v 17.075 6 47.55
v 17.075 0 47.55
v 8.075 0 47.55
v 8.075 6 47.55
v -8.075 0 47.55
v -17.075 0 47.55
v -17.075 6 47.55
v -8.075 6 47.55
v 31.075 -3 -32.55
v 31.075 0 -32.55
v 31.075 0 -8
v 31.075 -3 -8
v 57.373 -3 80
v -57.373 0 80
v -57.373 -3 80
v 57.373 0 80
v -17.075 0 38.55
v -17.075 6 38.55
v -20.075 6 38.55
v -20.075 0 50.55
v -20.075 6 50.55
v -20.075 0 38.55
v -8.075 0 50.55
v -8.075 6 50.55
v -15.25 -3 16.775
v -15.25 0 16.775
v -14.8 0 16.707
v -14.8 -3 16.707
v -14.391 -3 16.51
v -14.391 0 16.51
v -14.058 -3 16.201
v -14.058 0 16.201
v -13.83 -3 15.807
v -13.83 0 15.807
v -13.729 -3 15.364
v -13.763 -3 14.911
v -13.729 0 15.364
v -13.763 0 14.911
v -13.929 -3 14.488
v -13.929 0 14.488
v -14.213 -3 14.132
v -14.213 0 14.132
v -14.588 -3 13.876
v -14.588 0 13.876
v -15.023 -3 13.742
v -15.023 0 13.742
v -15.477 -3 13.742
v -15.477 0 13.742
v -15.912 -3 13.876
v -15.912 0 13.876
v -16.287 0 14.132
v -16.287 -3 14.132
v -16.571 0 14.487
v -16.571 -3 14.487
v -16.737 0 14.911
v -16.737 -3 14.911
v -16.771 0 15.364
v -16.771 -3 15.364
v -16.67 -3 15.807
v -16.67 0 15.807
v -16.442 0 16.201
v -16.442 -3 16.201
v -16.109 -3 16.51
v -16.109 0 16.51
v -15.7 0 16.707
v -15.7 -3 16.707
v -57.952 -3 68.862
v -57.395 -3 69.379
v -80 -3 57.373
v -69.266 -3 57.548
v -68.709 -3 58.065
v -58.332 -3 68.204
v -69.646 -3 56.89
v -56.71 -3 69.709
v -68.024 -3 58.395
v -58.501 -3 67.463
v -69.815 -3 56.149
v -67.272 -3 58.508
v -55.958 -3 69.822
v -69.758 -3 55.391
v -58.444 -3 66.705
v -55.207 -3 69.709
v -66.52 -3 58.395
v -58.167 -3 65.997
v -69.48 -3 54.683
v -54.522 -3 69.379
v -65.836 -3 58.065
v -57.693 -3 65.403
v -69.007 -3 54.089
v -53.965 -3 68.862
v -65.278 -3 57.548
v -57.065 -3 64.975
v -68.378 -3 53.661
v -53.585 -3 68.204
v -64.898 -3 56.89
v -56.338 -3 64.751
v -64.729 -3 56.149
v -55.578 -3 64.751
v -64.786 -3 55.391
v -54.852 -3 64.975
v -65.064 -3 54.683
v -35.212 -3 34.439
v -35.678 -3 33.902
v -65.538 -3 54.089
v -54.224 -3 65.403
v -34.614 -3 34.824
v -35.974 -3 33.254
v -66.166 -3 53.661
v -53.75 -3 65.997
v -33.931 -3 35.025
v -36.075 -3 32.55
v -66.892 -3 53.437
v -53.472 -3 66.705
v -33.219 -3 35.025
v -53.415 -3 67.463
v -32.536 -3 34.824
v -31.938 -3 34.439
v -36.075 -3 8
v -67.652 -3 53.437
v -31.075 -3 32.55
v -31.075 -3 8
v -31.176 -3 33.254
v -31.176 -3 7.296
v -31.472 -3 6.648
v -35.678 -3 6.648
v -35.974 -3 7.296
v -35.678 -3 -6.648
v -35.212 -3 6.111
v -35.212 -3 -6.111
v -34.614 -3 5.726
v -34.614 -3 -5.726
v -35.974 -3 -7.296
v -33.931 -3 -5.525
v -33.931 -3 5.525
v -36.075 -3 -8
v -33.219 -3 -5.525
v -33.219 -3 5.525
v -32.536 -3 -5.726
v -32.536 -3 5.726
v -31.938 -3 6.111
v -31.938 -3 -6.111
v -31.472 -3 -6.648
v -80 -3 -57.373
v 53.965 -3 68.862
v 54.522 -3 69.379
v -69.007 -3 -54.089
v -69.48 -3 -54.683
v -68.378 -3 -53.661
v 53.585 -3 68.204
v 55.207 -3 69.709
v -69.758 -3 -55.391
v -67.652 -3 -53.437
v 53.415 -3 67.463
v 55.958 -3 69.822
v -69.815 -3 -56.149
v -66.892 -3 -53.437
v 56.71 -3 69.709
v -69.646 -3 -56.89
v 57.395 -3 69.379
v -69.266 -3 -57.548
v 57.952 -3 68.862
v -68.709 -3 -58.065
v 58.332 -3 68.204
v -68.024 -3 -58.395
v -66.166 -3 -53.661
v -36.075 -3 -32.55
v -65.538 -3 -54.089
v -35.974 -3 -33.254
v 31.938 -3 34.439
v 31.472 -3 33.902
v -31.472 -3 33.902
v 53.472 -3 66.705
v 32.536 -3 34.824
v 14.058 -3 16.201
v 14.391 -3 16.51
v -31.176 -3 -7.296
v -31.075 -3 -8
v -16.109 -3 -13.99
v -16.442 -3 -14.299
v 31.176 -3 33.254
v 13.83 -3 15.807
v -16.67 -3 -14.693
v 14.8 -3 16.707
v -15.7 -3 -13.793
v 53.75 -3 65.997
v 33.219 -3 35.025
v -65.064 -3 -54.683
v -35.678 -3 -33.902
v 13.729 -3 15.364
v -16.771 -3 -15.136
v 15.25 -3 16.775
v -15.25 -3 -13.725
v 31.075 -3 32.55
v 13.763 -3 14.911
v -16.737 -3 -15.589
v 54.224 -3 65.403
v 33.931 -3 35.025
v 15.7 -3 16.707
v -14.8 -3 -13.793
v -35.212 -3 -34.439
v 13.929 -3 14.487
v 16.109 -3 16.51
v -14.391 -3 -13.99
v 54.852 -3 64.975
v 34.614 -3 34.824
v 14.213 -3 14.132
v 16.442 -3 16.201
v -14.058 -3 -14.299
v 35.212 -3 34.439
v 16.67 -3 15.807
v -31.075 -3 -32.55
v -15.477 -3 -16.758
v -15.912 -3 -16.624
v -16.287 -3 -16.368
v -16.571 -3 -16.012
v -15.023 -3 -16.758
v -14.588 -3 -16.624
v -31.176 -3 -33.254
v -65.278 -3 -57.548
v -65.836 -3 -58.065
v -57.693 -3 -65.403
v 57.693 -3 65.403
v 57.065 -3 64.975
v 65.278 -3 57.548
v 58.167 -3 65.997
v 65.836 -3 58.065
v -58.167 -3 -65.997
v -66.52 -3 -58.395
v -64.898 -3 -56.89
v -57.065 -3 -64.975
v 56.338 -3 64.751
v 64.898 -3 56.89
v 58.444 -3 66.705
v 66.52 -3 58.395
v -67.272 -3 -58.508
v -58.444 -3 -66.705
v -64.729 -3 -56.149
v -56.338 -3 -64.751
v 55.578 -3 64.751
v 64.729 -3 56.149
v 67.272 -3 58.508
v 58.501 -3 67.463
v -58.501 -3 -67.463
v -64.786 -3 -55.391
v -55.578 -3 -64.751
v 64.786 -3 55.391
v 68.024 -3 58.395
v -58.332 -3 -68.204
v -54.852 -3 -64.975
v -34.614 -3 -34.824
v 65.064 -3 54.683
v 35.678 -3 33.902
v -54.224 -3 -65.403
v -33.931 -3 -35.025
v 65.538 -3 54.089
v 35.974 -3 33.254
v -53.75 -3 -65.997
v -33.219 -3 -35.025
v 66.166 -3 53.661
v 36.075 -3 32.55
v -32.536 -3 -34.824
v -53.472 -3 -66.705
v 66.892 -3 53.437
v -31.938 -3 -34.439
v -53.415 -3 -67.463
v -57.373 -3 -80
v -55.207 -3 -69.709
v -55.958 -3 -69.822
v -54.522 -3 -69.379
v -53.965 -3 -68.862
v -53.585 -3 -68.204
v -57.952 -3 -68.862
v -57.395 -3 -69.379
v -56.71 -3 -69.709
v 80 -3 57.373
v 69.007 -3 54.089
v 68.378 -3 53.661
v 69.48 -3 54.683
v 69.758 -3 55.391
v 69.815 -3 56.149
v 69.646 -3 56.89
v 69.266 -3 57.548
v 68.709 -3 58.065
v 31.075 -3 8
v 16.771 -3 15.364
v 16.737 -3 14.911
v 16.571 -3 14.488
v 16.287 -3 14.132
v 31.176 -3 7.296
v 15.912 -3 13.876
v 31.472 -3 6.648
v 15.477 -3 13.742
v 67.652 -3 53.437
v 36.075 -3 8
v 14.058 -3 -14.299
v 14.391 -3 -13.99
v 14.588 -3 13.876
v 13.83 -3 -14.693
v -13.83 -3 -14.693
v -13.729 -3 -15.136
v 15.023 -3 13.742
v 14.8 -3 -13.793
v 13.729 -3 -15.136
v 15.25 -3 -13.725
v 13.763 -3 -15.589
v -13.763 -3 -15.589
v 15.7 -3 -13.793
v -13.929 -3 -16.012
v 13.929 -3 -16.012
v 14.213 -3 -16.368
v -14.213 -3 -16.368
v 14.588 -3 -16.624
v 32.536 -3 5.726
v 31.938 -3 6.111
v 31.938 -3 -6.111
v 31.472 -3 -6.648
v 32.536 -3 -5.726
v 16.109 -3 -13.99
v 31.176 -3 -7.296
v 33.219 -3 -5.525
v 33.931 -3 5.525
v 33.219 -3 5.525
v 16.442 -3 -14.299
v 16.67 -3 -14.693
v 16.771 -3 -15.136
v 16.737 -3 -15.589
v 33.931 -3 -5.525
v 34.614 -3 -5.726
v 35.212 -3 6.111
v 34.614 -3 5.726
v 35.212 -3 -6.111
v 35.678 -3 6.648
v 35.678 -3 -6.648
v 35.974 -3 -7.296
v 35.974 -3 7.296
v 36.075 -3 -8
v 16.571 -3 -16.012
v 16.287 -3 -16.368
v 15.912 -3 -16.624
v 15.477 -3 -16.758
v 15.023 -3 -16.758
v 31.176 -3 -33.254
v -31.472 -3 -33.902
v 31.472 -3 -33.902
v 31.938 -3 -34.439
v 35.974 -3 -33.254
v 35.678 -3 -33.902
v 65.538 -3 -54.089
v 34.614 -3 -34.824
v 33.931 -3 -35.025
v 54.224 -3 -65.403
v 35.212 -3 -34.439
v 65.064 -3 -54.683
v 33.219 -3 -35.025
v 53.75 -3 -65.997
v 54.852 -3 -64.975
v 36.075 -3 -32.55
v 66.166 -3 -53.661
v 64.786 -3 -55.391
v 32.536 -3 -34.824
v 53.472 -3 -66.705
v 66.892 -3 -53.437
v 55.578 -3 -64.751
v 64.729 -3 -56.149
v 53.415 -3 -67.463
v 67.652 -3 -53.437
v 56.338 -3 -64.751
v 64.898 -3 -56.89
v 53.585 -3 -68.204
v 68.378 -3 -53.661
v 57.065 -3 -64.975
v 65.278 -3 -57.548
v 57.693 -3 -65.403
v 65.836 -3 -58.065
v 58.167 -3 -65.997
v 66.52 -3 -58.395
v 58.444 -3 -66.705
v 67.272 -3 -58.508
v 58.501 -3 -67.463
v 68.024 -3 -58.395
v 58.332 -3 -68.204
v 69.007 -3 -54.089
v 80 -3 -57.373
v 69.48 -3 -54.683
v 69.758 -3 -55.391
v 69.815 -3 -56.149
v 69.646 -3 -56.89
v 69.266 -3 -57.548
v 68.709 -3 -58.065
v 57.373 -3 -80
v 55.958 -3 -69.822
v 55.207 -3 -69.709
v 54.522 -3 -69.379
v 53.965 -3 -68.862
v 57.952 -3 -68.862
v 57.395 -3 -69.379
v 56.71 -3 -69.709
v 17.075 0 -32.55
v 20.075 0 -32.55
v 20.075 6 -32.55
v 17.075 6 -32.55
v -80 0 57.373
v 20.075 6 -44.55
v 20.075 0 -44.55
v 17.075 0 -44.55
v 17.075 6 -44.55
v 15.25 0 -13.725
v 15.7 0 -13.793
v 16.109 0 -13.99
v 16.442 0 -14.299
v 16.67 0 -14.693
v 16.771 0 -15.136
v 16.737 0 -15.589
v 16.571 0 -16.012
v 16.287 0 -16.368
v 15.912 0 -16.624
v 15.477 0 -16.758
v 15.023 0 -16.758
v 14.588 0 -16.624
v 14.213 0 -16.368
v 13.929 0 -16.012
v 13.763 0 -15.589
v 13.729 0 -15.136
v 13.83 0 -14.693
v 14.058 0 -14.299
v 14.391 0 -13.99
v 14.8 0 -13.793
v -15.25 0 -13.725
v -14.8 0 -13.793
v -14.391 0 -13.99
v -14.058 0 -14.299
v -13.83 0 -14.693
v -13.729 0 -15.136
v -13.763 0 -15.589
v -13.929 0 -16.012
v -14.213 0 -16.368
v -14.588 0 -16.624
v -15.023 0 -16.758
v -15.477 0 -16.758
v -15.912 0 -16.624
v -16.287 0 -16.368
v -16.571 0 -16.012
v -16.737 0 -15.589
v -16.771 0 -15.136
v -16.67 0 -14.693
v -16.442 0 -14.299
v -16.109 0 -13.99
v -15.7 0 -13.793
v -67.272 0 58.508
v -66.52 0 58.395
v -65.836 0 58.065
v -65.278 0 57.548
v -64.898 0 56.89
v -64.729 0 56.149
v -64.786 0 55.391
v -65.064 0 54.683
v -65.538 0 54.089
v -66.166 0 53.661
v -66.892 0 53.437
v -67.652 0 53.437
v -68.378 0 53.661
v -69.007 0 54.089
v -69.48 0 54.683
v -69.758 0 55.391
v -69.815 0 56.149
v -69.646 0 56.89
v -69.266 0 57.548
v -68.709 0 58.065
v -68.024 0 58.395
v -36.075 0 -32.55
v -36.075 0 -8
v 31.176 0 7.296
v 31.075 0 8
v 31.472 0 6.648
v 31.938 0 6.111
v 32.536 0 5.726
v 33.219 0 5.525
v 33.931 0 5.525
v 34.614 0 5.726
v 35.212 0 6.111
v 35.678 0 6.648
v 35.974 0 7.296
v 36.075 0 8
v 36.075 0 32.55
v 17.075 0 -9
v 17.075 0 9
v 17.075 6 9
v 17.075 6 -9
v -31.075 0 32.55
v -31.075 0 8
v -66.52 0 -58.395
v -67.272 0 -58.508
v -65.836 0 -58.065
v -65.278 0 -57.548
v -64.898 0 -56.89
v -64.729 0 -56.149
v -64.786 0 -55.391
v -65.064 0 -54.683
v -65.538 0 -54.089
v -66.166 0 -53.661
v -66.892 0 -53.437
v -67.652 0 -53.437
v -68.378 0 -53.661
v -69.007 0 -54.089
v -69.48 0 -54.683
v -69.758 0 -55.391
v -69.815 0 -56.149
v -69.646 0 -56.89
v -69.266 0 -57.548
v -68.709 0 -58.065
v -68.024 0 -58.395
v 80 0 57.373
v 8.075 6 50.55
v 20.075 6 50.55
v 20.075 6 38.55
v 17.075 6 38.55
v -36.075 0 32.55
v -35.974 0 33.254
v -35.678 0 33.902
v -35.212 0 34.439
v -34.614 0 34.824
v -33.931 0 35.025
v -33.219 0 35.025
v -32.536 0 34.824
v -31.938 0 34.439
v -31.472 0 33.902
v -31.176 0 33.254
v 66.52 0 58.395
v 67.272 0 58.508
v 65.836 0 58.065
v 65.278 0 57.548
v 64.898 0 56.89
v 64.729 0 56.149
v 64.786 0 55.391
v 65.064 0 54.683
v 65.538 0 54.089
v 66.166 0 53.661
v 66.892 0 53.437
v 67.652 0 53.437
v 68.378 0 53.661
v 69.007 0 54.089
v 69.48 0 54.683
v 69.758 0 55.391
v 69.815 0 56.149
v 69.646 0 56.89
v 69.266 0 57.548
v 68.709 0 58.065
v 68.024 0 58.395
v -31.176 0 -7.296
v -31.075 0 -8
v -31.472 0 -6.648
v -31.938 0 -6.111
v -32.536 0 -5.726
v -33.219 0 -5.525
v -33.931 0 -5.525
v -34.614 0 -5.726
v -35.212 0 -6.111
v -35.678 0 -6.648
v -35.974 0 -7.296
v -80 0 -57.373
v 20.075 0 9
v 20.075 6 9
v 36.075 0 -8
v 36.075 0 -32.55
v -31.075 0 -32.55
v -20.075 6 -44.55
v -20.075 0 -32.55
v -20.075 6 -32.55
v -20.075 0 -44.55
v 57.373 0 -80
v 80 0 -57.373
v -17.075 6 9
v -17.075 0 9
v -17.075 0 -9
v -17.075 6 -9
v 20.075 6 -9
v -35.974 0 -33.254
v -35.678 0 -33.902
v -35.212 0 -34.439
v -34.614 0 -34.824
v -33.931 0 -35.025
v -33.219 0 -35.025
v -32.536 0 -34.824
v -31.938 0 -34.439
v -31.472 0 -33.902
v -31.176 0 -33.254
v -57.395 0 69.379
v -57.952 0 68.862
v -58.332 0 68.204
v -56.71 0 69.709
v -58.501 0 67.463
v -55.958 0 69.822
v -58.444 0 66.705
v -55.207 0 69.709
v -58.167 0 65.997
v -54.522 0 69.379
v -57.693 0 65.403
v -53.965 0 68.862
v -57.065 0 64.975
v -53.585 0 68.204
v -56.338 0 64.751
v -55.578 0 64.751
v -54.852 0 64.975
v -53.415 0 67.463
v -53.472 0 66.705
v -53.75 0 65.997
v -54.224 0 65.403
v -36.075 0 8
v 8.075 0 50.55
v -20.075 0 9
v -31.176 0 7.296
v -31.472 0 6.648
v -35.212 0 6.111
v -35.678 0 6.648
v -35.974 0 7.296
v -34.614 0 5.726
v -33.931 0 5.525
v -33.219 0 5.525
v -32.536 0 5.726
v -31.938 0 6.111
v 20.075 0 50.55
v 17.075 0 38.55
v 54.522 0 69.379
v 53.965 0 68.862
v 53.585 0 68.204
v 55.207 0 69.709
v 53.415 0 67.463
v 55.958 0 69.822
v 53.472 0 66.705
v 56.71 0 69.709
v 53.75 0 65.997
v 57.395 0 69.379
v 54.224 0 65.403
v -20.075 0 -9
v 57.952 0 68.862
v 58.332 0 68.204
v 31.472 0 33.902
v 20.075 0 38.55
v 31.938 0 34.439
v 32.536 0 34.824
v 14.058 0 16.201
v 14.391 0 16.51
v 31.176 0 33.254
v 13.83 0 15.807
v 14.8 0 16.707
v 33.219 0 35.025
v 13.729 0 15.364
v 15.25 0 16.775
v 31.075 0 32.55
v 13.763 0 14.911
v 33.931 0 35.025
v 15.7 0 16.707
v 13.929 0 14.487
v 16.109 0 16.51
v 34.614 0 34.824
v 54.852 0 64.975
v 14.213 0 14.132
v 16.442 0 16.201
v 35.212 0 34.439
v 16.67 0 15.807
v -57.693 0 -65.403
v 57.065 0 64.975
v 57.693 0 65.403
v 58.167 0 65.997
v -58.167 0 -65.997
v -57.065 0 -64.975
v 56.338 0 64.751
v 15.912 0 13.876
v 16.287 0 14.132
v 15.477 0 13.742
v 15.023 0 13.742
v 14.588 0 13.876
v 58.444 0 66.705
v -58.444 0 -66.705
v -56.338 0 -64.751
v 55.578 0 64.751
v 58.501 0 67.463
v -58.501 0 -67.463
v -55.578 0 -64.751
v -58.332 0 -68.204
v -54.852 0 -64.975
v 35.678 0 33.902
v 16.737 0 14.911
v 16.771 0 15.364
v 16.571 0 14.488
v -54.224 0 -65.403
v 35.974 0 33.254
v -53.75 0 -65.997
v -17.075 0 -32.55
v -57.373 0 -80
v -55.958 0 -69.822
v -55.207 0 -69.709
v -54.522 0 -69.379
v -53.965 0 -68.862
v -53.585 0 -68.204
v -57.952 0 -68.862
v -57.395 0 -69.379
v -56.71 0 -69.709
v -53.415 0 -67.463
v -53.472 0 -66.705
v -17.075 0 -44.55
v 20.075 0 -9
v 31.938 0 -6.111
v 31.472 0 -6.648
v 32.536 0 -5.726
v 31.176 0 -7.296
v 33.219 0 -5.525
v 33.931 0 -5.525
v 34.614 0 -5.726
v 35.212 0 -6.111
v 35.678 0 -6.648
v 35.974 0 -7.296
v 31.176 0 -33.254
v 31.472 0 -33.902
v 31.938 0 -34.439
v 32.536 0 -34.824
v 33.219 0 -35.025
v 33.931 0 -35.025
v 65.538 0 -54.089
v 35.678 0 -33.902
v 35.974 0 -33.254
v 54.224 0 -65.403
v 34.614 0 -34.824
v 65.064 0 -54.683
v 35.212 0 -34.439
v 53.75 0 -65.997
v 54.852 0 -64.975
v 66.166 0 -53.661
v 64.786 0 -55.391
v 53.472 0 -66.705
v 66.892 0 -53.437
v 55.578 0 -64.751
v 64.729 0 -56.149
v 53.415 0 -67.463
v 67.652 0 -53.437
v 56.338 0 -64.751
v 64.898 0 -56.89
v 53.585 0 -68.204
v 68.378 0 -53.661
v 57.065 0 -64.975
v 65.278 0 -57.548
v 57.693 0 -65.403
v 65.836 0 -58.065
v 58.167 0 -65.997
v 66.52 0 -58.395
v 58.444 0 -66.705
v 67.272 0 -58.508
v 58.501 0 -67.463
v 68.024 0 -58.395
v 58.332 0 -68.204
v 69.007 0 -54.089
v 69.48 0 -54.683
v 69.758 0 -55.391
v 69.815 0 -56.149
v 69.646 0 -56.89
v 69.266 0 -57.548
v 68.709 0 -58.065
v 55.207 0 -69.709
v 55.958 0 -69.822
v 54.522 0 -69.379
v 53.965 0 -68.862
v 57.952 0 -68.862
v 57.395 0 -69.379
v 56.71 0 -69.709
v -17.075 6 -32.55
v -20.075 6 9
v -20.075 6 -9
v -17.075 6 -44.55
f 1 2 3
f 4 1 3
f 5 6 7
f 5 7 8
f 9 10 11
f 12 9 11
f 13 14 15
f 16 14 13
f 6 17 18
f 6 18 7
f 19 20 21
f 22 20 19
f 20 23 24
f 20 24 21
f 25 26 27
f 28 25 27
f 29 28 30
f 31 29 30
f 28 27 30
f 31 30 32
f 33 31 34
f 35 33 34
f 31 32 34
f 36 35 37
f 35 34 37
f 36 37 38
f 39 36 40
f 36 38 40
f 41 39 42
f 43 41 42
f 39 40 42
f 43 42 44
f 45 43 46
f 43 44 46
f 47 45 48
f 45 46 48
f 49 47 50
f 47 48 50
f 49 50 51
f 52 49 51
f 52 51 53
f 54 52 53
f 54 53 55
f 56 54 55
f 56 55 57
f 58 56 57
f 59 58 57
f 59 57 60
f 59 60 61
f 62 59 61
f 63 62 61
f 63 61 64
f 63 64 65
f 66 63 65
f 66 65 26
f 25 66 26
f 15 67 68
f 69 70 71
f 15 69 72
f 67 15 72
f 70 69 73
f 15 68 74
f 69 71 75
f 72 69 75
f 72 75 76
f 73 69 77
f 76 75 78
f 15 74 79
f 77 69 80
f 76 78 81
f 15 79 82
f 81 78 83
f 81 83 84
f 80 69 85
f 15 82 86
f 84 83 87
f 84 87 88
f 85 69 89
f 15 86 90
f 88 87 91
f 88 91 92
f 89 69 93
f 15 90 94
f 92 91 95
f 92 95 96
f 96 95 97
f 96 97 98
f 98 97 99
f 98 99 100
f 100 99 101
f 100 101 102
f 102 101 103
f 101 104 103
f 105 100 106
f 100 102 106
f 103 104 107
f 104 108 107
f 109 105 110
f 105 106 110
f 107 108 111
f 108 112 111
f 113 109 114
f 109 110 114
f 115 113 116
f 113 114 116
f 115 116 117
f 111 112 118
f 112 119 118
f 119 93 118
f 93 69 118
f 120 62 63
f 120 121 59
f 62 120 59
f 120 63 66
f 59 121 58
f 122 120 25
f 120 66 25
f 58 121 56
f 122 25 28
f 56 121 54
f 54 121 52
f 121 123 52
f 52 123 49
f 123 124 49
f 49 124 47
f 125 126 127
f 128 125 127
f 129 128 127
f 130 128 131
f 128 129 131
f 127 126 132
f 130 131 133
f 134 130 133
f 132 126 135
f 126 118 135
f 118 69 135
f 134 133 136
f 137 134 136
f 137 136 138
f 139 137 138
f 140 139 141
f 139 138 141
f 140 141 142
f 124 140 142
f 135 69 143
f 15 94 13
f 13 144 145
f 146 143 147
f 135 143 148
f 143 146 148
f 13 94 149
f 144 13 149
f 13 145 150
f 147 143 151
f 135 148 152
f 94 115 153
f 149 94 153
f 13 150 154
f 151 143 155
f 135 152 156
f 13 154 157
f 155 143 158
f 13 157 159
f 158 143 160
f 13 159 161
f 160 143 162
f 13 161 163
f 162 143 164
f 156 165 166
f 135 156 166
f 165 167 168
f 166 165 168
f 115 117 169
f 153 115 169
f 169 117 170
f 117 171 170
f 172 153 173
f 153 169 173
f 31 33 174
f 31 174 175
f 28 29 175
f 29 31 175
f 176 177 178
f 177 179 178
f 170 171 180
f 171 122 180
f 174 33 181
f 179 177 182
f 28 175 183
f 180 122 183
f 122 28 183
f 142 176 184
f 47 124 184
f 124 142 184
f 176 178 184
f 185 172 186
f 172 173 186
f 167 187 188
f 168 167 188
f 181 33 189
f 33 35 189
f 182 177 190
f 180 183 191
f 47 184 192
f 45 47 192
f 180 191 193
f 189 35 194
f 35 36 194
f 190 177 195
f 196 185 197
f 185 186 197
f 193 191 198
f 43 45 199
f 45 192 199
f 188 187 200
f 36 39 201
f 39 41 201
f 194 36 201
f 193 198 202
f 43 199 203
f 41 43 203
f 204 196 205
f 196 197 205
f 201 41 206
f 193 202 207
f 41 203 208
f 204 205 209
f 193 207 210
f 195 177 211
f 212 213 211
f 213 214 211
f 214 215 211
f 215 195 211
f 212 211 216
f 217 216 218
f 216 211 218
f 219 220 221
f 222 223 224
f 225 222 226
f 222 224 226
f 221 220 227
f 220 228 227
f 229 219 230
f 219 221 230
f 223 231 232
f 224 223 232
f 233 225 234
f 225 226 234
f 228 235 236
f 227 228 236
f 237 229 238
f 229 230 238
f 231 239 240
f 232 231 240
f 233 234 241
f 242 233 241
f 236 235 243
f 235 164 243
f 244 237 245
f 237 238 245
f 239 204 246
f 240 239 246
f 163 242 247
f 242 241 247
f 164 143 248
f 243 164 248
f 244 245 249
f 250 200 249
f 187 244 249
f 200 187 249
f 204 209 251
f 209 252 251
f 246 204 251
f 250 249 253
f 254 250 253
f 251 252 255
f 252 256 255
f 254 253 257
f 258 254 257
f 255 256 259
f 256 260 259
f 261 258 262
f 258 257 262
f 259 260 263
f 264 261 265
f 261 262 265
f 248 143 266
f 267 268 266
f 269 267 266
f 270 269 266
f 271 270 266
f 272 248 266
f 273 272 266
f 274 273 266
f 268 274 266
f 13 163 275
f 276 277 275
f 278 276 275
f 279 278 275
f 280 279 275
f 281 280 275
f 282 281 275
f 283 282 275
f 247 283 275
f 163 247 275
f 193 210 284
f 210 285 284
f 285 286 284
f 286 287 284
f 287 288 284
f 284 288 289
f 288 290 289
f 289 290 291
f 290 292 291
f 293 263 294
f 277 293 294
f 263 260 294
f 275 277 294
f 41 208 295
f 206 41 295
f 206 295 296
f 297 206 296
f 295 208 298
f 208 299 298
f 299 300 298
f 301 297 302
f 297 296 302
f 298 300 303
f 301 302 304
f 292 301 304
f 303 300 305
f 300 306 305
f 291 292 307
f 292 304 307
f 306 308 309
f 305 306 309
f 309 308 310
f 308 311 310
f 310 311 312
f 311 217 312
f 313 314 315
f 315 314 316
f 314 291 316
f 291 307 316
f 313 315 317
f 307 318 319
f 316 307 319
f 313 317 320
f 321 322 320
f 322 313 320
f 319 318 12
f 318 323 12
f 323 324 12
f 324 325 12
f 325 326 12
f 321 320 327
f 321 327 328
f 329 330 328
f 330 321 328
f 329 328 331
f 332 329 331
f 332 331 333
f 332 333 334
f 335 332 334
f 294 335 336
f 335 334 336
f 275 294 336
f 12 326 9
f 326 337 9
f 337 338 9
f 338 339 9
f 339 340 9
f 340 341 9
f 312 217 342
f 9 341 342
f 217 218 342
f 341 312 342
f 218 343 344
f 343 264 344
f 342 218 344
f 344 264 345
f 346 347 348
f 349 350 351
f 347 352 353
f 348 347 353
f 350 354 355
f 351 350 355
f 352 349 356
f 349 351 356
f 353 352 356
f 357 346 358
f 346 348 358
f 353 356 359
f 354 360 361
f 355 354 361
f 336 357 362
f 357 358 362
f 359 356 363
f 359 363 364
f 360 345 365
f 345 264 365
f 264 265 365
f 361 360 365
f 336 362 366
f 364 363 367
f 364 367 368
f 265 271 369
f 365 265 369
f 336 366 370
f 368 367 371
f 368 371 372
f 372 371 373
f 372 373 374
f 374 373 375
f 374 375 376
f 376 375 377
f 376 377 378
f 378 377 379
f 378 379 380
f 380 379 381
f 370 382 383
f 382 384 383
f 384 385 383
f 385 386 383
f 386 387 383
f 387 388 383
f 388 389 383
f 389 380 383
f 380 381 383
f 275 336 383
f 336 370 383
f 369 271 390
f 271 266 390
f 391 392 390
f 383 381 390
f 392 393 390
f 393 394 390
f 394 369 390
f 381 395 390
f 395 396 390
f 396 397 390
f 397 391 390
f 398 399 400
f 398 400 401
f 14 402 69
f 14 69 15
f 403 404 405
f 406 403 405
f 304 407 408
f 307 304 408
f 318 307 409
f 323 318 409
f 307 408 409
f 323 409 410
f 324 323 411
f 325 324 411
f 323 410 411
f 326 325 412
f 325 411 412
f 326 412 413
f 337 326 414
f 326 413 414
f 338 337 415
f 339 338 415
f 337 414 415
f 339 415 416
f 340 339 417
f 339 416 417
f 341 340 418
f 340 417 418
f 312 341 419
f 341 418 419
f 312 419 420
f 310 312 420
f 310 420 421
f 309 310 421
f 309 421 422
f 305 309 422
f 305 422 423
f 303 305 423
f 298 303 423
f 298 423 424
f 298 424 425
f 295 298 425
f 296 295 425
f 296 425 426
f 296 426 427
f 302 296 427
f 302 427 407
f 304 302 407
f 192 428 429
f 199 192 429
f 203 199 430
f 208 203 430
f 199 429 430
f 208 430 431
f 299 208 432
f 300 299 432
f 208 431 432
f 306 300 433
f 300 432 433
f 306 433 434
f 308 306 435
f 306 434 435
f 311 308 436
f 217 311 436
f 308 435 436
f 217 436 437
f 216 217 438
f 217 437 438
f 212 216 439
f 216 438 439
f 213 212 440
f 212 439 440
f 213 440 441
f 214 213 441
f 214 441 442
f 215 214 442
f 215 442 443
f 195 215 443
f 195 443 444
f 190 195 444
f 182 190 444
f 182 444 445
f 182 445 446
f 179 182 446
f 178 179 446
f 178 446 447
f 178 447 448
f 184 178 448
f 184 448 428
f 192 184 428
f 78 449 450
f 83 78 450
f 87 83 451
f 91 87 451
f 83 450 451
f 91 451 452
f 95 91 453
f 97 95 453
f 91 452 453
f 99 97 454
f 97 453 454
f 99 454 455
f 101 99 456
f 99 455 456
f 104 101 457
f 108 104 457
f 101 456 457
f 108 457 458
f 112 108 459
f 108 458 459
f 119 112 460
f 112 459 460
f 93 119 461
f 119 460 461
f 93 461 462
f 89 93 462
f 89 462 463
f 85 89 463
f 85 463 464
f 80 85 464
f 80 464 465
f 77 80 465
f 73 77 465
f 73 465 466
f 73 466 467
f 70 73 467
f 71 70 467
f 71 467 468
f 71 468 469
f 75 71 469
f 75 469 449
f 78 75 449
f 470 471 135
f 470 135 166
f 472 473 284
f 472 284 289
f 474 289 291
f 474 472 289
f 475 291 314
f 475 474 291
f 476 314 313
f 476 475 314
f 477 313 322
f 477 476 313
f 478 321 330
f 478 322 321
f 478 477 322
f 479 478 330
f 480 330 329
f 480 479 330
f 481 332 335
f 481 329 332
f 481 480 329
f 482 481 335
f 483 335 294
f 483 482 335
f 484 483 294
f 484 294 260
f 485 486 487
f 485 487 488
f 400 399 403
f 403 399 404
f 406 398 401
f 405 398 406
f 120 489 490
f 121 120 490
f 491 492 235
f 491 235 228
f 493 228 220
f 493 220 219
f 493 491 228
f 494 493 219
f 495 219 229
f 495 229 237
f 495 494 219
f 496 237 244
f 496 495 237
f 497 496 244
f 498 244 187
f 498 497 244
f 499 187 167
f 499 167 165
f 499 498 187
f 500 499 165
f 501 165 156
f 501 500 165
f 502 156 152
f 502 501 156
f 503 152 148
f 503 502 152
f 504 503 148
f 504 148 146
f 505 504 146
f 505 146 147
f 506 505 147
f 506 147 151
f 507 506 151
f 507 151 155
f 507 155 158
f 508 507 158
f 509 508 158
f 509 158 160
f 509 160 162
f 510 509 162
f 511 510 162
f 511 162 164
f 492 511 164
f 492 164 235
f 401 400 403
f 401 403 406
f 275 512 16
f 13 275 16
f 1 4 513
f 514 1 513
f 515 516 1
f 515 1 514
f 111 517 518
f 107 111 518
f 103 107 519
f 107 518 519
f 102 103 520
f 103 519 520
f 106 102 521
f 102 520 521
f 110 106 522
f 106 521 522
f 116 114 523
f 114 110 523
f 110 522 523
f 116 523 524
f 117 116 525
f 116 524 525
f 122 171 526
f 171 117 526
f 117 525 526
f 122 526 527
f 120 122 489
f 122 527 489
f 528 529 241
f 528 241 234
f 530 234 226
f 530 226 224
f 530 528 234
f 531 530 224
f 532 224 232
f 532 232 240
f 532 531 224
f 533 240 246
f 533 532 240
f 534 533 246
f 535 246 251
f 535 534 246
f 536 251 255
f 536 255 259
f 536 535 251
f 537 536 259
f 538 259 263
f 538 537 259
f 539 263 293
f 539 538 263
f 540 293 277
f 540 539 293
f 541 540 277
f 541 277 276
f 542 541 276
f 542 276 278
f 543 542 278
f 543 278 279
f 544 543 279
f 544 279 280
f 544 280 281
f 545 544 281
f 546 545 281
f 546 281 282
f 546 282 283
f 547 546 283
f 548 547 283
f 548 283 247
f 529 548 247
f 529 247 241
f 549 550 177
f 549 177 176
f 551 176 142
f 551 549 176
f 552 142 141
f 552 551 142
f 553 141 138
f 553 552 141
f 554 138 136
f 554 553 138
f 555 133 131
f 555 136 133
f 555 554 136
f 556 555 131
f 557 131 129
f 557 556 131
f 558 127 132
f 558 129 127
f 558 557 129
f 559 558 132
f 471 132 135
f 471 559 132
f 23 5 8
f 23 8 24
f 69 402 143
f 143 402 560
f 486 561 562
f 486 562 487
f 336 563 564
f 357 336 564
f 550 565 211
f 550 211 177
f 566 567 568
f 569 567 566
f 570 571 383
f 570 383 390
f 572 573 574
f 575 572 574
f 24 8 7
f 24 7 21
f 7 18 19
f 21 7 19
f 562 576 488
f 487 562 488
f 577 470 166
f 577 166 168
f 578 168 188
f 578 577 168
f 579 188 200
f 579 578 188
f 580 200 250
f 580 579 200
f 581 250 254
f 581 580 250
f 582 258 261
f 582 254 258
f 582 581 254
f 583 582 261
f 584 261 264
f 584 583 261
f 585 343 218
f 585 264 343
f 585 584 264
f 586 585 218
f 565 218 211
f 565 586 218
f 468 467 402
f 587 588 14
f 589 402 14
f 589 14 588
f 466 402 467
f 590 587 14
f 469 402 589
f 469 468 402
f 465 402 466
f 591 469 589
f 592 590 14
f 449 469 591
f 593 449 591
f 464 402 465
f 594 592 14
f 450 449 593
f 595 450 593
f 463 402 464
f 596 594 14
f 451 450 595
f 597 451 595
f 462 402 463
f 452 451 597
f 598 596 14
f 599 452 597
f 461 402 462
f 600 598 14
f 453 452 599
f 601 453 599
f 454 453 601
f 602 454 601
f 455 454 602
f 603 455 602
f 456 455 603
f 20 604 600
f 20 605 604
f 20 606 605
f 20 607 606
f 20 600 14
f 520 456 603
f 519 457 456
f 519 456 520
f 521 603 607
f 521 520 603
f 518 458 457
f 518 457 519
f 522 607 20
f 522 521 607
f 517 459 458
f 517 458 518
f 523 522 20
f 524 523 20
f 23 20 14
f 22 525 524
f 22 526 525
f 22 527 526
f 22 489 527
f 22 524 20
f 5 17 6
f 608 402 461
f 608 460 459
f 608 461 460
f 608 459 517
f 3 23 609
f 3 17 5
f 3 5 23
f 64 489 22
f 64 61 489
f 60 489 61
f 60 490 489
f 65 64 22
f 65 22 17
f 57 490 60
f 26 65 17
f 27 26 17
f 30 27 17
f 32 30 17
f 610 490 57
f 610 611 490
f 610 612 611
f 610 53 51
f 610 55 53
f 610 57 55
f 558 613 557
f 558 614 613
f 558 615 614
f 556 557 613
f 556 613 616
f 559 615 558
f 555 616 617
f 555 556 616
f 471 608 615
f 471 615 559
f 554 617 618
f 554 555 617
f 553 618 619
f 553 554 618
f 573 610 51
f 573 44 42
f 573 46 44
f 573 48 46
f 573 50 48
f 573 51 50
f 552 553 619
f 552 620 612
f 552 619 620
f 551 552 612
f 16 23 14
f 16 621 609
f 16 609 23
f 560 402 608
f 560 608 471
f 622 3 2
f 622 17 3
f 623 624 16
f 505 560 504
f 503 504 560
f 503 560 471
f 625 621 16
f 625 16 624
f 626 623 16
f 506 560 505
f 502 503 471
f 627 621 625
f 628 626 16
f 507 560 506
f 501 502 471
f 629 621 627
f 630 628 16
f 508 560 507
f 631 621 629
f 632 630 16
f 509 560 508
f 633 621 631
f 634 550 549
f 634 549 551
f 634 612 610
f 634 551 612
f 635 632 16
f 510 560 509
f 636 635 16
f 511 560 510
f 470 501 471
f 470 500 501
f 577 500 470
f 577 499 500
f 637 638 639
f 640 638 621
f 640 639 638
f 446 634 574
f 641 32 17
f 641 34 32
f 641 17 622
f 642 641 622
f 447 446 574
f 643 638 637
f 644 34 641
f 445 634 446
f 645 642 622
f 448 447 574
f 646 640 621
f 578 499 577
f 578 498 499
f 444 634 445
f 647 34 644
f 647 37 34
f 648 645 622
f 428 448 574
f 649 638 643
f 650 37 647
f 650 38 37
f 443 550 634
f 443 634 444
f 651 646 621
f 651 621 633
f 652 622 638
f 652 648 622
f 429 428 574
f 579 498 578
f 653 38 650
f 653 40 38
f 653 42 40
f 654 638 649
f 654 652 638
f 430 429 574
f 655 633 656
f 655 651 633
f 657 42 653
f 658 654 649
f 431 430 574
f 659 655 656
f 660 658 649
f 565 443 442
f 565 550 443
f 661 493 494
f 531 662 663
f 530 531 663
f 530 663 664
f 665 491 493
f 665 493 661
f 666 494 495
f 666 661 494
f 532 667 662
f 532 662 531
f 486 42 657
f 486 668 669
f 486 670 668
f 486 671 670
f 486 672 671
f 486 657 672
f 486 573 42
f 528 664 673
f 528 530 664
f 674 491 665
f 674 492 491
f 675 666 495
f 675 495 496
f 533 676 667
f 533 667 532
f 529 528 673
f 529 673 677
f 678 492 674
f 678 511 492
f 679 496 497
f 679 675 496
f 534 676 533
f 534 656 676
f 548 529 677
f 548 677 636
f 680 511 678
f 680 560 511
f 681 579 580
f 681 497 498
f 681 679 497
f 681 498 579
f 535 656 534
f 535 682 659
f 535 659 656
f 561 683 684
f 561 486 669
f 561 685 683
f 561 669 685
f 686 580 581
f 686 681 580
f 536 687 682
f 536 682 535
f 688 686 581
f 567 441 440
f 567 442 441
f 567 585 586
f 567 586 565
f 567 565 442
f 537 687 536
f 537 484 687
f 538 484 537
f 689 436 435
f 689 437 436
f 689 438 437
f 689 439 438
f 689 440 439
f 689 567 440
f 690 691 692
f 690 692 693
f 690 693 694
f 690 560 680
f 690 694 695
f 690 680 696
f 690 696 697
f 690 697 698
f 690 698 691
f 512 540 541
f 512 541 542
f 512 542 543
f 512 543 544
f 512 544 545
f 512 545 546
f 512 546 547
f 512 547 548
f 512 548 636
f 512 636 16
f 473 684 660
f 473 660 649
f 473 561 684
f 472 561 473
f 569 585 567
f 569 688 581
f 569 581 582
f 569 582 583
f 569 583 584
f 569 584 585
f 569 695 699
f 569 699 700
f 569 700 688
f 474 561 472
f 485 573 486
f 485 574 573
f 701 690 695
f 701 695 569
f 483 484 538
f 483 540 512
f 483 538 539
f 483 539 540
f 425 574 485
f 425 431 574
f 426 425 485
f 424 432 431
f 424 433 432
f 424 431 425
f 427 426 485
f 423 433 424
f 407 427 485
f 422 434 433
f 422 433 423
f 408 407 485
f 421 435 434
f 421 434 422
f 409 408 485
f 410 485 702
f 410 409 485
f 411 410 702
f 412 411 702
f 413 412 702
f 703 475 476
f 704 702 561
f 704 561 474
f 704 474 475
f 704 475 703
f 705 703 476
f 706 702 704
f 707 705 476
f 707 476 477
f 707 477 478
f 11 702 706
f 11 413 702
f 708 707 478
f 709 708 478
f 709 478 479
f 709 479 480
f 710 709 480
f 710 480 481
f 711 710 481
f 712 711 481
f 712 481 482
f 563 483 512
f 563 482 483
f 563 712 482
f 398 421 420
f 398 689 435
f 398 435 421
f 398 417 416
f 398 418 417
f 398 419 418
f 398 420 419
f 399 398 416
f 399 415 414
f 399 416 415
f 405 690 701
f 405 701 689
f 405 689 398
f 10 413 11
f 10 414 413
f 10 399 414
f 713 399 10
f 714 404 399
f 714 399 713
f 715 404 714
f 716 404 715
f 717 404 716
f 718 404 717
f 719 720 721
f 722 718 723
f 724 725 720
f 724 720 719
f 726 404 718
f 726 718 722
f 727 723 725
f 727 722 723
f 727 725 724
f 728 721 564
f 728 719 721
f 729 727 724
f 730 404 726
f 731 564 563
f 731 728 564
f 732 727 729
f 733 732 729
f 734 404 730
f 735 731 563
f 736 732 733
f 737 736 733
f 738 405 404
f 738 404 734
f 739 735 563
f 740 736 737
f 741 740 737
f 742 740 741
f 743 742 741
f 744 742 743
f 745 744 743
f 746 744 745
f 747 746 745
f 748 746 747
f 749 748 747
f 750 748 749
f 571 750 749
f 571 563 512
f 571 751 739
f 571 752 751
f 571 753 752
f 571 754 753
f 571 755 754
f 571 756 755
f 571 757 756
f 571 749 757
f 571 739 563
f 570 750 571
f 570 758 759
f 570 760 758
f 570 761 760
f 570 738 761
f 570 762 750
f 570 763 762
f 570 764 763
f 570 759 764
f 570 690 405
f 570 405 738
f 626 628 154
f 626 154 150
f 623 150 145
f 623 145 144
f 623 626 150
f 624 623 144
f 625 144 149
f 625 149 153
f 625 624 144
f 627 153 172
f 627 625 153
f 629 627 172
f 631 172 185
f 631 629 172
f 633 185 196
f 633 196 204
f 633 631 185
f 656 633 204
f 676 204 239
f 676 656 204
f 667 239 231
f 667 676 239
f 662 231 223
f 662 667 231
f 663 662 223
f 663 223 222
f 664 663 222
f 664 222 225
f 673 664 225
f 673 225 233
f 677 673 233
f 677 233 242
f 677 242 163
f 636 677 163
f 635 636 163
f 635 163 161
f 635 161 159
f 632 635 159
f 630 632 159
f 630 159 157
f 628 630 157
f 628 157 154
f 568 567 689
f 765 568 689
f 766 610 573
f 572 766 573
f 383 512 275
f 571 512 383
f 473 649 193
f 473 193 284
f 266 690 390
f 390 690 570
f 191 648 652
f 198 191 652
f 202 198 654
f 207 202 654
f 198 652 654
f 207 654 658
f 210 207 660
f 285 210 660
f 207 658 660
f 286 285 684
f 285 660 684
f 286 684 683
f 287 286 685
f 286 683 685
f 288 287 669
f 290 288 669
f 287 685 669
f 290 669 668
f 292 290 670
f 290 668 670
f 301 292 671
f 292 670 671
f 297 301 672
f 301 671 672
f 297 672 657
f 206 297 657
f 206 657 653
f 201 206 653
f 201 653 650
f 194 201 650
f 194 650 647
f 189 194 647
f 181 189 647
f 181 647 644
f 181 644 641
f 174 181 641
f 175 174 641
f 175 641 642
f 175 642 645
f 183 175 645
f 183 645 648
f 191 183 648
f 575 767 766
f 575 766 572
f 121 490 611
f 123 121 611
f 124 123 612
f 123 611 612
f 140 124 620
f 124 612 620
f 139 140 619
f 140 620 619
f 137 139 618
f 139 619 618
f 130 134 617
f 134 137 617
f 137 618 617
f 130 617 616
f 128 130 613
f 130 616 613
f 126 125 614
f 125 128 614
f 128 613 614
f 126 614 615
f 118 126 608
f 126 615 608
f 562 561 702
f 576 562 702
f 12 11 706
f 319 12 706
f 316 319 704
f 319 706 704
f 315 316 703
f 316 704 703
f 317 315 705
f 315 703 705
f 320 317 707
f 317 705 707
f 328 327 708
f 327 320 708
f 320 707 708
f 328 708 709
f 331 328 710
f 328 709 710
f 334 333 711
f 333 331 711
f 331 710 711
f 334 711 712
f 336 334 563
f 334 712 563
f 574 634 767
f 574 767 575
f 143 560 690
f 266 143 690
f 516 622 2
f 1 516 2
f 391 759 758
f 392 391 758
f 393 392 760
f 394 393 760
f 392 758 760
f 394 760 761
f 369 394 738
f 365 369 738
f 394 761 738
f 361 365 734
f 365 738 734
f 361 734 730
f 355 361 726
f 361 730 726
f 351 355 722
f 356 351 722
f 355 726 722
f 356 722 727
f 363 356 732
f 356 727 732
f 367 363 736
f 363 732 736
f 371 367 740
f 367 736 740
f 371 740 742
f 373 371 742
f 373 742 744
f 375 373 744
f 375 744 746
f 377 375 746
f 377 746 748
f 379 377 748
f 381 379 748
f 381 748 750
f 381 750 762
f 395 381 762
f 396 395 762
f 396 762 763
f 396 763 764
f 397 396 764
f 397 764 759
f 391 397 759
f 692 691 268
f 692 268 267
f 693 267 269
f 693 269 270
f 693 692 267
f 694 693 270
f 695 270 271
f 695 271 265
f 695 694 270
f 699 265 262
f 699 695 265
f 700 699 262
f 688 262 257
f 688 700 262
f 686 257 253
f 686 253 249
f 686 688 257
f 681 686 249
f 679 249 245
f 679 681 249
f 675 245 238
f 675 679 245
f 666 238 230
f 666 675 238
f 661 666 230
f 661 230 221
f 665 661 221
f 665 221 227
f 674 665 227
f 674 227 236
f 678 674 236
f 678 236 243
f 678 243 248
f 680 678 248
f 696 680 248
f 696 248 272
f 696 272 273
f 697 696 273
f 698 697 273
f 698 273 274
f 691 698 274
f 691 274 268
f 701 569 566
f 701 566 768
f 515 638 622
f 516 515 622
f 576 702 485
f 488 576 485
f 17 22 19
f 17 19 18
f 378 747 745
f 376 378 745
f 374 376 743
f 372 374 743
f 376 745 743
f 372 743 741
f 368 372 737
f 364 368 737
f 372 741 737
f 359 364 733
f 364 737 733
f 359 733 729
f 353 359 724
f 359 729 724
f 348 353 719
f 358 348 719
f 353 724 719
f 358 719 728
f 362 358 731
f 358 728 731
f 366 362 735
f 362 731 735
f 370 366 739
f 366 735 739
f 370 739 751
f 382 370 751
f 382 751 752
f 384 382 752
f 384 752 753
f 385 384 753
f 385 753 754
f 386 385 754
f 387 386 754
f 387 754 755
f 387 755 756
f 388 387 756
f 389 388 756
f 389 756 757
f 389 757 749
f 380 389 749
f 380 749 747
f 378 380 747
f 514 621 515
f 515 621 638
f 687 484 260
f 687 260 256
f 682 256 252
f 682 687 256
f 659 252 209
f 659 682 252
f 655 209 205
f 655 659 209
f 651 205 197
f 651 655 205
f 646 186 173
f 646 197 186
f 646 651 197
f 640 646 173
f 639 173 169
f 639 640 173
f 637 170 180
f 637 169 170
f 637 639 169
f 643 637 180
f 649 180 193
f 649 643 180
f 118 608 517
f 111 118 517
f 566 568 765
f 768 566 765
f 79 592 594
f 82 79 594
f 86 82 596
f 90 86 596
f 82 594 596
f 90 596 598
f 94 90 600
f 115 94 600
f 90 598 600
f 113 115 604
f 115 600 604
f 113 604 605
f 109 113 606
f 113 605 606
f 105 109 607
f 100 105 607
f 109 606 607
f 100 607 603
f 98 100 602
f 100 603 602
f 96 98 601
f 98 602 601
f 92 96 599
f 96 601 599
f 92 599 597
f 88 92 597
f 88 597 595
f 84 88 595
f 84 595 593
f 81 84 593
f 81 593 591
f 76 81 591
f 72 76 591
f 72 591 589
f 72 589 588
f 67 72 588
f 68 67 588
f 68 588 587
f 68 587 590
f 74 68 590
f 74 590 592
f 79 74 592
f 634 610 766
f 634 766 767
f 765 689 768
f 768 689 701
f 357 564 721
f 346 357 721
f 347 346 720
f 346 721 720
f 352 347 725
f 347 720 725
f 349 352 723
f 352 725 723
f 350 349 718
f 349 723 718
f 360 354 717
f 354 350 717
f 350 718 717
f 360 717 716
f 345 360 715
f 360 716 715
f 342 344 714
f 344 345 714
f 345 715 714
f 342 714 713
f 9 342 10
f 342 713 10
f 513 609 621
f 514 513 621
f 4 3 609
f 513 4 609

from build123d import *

# Parameters (mm, degrees)
SKETCH1_W                                  = 160
SKETCH1_H                                  = 160
BOSS_EXTRUDE1_DEPTH                        = 3
CUT_EXTRUDE2_REACH                         = 115.177
CUT_EXTRUDE1_REACH                         = 115.177
SKETCH2_R                                  = 2.55
MIRROR2_AT_THE_SECOND_PLANE_COPY_1_REACH   = 115.177
MIRROR2_AT_THE_SECOND_PLANE_COPY_2_REACH   = 115.177
MIRROR2_AT_THE_SECOND_PLANE_COPY_2_SKETC_R = 2.55
CUT_EXTRUDE3_REACH                         = 115.177
SKETCH11_R                                 = 1.525
SKETCH12_W                                 = 3
SKETCH12_H                                 = 12
SKETCH12_H_2                               = 18
BOSS_EXTRUDE2_DEPTH                        = 6
CUT_EXTRUDE4_REACH                         = 115.296
MIRROR4_AT_THE_SECOND_PLANE_COPY_1_REACH   = 115.296


with BuildPart() as part:
    # Sketch1 → Boss-Extrude1 (new body)
    with BuildSketch(Plane(origin=(0, 0, 0), x_dir=(1, 0, 0), z_dir=(0, 1, 0))):
        Rectangle(SKETCH1_W, SKETCH1_H)
    extrude(amount=-BOSS_EXTRUDE1_DEPTH)

    # Sketch6 → Cut-Extrude2 (cut, up to next)
    with BuildSketch(Plane(origin=(0, 0, 0), x_dir=(1, 0, 0), z_dir=(0, 1, 0)), mode=Mode.PRIVATE) as cut_extrude2_sk1:
        Polygon((-80, -57.372583002), (-57.372583002, -80), (-80, -80), align=None)
    cut_extrude2_tool1 = extrude(cut_extrude2_sk1.sketch, amount=-CUT_EXTRUDE2_REACH, mode=Mode.PRIVATE) & part.part
    cut_extrude2 = cut_extrude2_tool1.solids().sort_by_distance((-72.457528, 0, 72.457528))[0]
    add(cut_extrude2, mode=Mode.SUBTRACT)

    # Sketch2 → Cut-Extrude1 (cut, up to next)
    with BuildSketch(Plane(origin=(0, 0, 0), x_dir=(1, 0, 0), z_dir=(0, 1, 0)), mode=Mode.PRIVATE) as cut_extrude1_sk1:
        with Locations(Location((-67.272077939, -55.95836944, 0), (0, 0, 270))):
            Circle(SKETCH2_R)
    cut_extrude1_tool1 = extrude(cut_extrude1_sk1.sketch, amount=-CUT_EXTRUDE1_REACH, mode=Mode.PRIVATE) & part.part
    # Sketch2 → Cut-Extrude1 (cut, up to next)
    with BuildSketch(Plane(origin=(0, 0, 0), x_dir=(1, 0, 0), z_dir=(0, 1, 0)), mode=Mode.PRIVATE) as cut_extrude1_sk2:
        with Locations(Location((-55.95836944, -67.272077939, 0), (0, 0, 270))):
            Circle(SKETCH2_R)
    cut_extrude1_tool2 = extrude(cut_extrude1_sk2.sketch, amount=-CUT_EXTRUDE1_REACH, mode=Mode.PRIVATE) & part.part
    cut_extrude1_1 = cut_extrude1_tool1.solids().sort_by_distance((-67.272078, 0, 55.958369))[0]
    add(cut_extrude1_1, mode=Mode.SUBTRACT)
    cut_extrude1_2 = cut_extrude1_tool2.solids().sort_by_distance((-55.958369, 0, 67.272078))[0]
    add(cut_extrude1_2, mode=Mode.SUBTRACT)
    cut_extrude1 = cut_extrude1_1 + cut_extrude1_2  # Cut-Extrude1 as one shape, for the pattern or mirror that repeats it

    # Mirror2: Cut-Extrude2, Cut-Extrude1 across plane
    add(cut_extrude2.mirror(Plane(origin=(0, 0, 0), x_dir=(0, 0, 1), z_dir=(1, 0, 0))), mode=Mode.SUBTRACT)
    add(cut_extrude1.mirror(Plane(origin=(0, 0, 0), x_dir=(0, 0, 1), z_dir=(1, 0, 0))), mode=Mode.SUBTRACT)

    # Mirror2 at the second plane: Cut-Extrude2, Cut-Extrude1 across plane
    add(cut_extrude2.mirror(Plane.XY), mode=Mode.SUBTRACT)
    add(cut_extrude1.mirror(Plane.XY), mode=Mode.SUBTRACT)

    # Mirror2 at the second plane copy 1 sketc → Mirror2 at the second plane copy 1 (cut, up to next)
    with BuildSketch(Plane(origin=(0, 0, 0), x_dir=(-1, 0, 0), z_dir=(0, 1, 0)), mode=Mode.PRIVATE) as mirror2_at_the_second_plane_copy_1_sk1:
        Polygon((-80, -57.372583002), (-57.372583002, -80), (-80, -80), align=None)
    mirror2_at_the_second_plane_copy_1_tool1 = extrude(mirror2_at_the_second_plane_copy_1_sk1.sketch, amount=-MIRROR2_AT_THE_SECOND_PLANE_COPY_1_REACH, mode=Mode.PRIVATE) & part.part
    add(mirror2_at_the_second_plane_copy_1_tool1.solids().sort_by_distance((72.457528, 0, -72.457528))[0], mode=Mode.SUBTRACT)

    # Mirror2 at the second plane copy 2 sketc → Mirror2 at the second plane copy 2 (cut, up to next)
    with BuildSketch(Plane(origin=(0, 0, 0), x_dir=(-1, 0, 0), z_dir=(0, 1, 0)), mode=Mode.PRIVATE) as mirror2_at_the_second_plane_copy_2_sk1:
        with Locations(Location((-67.272077939, -55.95836944, 0), (0, 0, 270))):
            Circle(MIRROR2_AT_THE_SECOND_PLANE_COPY_2_SKETC_R)
    mirror2_at_the_second_plane_copy_2_tool1 = extrude(mirror2_at_the_second_plane_copy_2_sk1.sketch, amount=-MIRROR2_AT_THE_SECOND_PLANE_COPY_2_REACH, mode=Mode.PRIVATE) & part.part
    # Mirror2 at the second plane copy 2 sketc → Mirror2 at the second plane copy 2 (cut, up to next)
    with BuildSketch(Plane(origin=(0, 0, 0), x_dir=(-1, 0, 0), z_dir=(0, 1, 0)), mode=Mode.PRIVATE) as mirror2_at_the_second_plane_copy_2_sk2:
        with Locations(Location((-55.95836944, -67.272077939, 0), (0, 0, 270))):
            Circle(MIRROR2_AT_THE_SECOND_PLANE_COPY_2_SKETC_R)
    mirror2_at_the_second_plane_copy_2_tool2 = extrude(mirror2_at_the_second_plane_copy_2_sk2.sketch, amount=-MIRROR2_AT_THE_SECOND_PLANE_COPY_2_REACH, mode=Mode.PRIVATE) & part.part
    add(mirror2_at_the_second_plane_copy_2_tool1.solids().sort_by_distance((67.272078, 0, -55.958369))[0], mode=Mode.SUBTRACT)
    add(mirror2_at_the_second_plane_copy_2_tool2.solids().sort_by_distance((55.958369, 0, -67.272078))[0], mode=Mode.SUBTRACT)

    # Sketch11 → Cut-Extrude3 (cut, up to next)
    with BuildSketch(Plane(origin=(0, 0, 0), x_dir=(1, 0, 0), z_dir=(0, 1, 0)), mode=Mode.PRIVATE) as cut_extrude3_sk1:
        with Locations(Location((-15.25, 15.25, 0), (0, 0, 270))):
            Circle(SKETCH11_R)
    cut_extrude3_tool1 = extrude(cut_extrude3_sk1.sketch, amount=-CUT_EXTRUDE3_REACH, mode=Mode.PRIVATE) & part.part
    # Sketch11 → Cut-Extrude3 (cut, up to next)
    with BuildSketch(Plane(origin=(0, 0, 0), x_dir=(1, 0, 0), z_dir=(0, 1, 0)), mode=Mode.PRIVATE) as cut_extrude3_sk2:
        with Locations(Location((15.25, 15.25, 0), (0, 0, 270))):
            Circle(SKETCH11_R)
    cut_extrude3_tool2 = extrude(cut_extrude3_sk2.sketch, amount=-CUT_EXTRUDE3_REACH, mode=Mode.PRIVATE) & part.part
    # Sketch11 → Cut-Extrude3 (cut, up to next)
    with BuildSketch(Plane(origin=(0, 0, 0), x_dir=(1, 0, 0), z_dir=(0, 1, 0)), mode=Mode.PRIVATE) as cut_extrude3_sk3:
        with Locations(Location((15.25, -15.25, 0), (0, 0, 270))):
            Circle(SKETCH11_R)
    cut_extrude3_tool3 = extrude(cut_extrude3_sk3.sketch, amount=-CUT_EXTRUDE3_REACH, mode=Mode.PRIVATE) & part.part
    # Sketch11 → Cut-Extrude3 (cut, up to next)
    with BuildSketch(Plane(origin=(0, 0, 0), x_dir=(1, 0, 0), z_dir=(0, 1, 0)), mode=Mode.PRIVATE) as cut_extrude3_sk4:
        with Locations(Location((-15.25, -15.25, 0), (0, 0, 270))):
            Circle(SKETCH11_R)
    cut_extrude3_tool4 = extrude(cut_extrude3_sk4.sketch, amount=-CUT_EXTRUDE3_REACH, mode=Mode.PRIVATE) & part.part
    add(cut_extrude3_tool1.solids().sort_by_distance((-15.25, 0, -15.25))[0], mode=Mode.SUBTRACT)
    add(cut_extrude3_tool2.solids().sort_by_distance((15.25, 0, -15.25))[0], mode=Mode.SUBTRACT)
    add(cut_extrude3_tool3.solids().sort_by_distance((15.25, 0, 15.25))[0], mode=Mode.SUBTRACT)
    add(cut_extrude3_tool4.solids().sort_by_distance((-15.25, 0, 15.25))[0], mode=Mode.SUBTRACT)

    # Sketch12 → Boss-Extrude2 (add)
    with BuildSketch(Plane(origin=(0, 0, 0), x_dir=(1, 0, 0), z_dir=(0, 1, 0))):
        Polygon((-17.075, -47.55), (-8.075, -47.55), (-8.075, -50.55), (-20.075, -50.55), (-20.075, -38.55), (-17.075, -38.55), align=None)
        with Locations((-18.575, 38.55)):
            Rectangle(SKETCH12_W, SKETCH12_H)
        with Locations((-18.575, 0)):
            Rectangle(SKETCH12_W, SKETCH12_H_2)
    boss_extrude2 = extrude(amount=BOSS_EXTRUDE2_DEPTH)

    # Mirror3: Boss-Extrude2 across plane
    add(boss_extrude2.mirror(Plane(origin=(0, 0, 0), x_dir=(0, 0, 1), z_dir=(1, 0, 0))))

    # Sketch13 → Cut-Extrude4 (cut, up to next)
    with BuildSketch(Plane(origin=(0, 0, 0), x_dir=(1, 0, 0), z_dir=(0, 1, 0)), mode=Mode.PRIVATE) as cut_extrude4_sk1:
        with BuildLine():
            Line((-31.075, 32.55), (-31.075, 8))
            ThreePointArc((-31.075, 8), (-33.575, 5.5), (-36.075, 8))
            Line((-36.075, 8), (-36.075, 32.55))
            ThreePointArc((-36.075, 32.55), (-33.575, 35.05), (-31.075, 32.55))
        make_face()
    cut_extrude4_tool1 = extrude(cut_extrude4_sk1.sketch, amount=-CUT_EXTRUDE4_REACH, mode=Mode.PRIVATE) & part.part
    cut_extrude4 = cut_extrude4_tool1.solids().sort_by_distance((-33.575, 0, -20.275))[0]
    add(cut_extrude4, mode=Mode.SUBTRACT)

    # Mirror4: Cut-Extrude4 across plane
    add(cut_extrude4.mirror(Plane(origin=(0, 0, 0), x_dir=(0, 0, 1), z_dir=(1, 0, 0))), mode=Mode.SUBTRACT)

    # Mirror4 at the second plane: Cut-Extrude4 across plane
    add(cut_extrude4.mirror(Plane.XY), mode=Mode.SUBTRACT)

    # Mirror4 at the second plane copy 1 sketc → Mirror4 at the second plane copy 1 (cut, up to next)
    with BuildSketch(Plane(origin=(0, 0, 0), x_dir=(-1, 0, 0), z_dir=(0, 1, 0)), mode=Mode.PRIVATE) as mirror4_at_the_second_plane_copy_1_sk1:
        with BuildLine():
            Line((-31.075, 32.55), (-31.075, 8))
            ThreePointArc((-31.075, 8), (-33.575, 5.5), (-36.075, 8))
            Line((-36.075, 8), (-36.075, 32.55))
            ThreePointArc((-36.075, 32.55), (-33.575, 35.05), (-31.075, 32.55))
        make_face()
    mirror4_at_the_second_plane_copy_1_tool1 = extrude(mirror4_at_the_second_plane_copy_1_sk1.sketch, amount=-MIRROR4_AT_THE_SECOND_PLANE_COPY_1_REACH, mode=Mode.PRIVATE) & part.part
    add(mirror4_at_the_second_plane_copy_1_tool1.solids().sort_by_distance((33.575, 0, 20.275))[0], mode=Mode.SUBTRACT)


solid = part.part
